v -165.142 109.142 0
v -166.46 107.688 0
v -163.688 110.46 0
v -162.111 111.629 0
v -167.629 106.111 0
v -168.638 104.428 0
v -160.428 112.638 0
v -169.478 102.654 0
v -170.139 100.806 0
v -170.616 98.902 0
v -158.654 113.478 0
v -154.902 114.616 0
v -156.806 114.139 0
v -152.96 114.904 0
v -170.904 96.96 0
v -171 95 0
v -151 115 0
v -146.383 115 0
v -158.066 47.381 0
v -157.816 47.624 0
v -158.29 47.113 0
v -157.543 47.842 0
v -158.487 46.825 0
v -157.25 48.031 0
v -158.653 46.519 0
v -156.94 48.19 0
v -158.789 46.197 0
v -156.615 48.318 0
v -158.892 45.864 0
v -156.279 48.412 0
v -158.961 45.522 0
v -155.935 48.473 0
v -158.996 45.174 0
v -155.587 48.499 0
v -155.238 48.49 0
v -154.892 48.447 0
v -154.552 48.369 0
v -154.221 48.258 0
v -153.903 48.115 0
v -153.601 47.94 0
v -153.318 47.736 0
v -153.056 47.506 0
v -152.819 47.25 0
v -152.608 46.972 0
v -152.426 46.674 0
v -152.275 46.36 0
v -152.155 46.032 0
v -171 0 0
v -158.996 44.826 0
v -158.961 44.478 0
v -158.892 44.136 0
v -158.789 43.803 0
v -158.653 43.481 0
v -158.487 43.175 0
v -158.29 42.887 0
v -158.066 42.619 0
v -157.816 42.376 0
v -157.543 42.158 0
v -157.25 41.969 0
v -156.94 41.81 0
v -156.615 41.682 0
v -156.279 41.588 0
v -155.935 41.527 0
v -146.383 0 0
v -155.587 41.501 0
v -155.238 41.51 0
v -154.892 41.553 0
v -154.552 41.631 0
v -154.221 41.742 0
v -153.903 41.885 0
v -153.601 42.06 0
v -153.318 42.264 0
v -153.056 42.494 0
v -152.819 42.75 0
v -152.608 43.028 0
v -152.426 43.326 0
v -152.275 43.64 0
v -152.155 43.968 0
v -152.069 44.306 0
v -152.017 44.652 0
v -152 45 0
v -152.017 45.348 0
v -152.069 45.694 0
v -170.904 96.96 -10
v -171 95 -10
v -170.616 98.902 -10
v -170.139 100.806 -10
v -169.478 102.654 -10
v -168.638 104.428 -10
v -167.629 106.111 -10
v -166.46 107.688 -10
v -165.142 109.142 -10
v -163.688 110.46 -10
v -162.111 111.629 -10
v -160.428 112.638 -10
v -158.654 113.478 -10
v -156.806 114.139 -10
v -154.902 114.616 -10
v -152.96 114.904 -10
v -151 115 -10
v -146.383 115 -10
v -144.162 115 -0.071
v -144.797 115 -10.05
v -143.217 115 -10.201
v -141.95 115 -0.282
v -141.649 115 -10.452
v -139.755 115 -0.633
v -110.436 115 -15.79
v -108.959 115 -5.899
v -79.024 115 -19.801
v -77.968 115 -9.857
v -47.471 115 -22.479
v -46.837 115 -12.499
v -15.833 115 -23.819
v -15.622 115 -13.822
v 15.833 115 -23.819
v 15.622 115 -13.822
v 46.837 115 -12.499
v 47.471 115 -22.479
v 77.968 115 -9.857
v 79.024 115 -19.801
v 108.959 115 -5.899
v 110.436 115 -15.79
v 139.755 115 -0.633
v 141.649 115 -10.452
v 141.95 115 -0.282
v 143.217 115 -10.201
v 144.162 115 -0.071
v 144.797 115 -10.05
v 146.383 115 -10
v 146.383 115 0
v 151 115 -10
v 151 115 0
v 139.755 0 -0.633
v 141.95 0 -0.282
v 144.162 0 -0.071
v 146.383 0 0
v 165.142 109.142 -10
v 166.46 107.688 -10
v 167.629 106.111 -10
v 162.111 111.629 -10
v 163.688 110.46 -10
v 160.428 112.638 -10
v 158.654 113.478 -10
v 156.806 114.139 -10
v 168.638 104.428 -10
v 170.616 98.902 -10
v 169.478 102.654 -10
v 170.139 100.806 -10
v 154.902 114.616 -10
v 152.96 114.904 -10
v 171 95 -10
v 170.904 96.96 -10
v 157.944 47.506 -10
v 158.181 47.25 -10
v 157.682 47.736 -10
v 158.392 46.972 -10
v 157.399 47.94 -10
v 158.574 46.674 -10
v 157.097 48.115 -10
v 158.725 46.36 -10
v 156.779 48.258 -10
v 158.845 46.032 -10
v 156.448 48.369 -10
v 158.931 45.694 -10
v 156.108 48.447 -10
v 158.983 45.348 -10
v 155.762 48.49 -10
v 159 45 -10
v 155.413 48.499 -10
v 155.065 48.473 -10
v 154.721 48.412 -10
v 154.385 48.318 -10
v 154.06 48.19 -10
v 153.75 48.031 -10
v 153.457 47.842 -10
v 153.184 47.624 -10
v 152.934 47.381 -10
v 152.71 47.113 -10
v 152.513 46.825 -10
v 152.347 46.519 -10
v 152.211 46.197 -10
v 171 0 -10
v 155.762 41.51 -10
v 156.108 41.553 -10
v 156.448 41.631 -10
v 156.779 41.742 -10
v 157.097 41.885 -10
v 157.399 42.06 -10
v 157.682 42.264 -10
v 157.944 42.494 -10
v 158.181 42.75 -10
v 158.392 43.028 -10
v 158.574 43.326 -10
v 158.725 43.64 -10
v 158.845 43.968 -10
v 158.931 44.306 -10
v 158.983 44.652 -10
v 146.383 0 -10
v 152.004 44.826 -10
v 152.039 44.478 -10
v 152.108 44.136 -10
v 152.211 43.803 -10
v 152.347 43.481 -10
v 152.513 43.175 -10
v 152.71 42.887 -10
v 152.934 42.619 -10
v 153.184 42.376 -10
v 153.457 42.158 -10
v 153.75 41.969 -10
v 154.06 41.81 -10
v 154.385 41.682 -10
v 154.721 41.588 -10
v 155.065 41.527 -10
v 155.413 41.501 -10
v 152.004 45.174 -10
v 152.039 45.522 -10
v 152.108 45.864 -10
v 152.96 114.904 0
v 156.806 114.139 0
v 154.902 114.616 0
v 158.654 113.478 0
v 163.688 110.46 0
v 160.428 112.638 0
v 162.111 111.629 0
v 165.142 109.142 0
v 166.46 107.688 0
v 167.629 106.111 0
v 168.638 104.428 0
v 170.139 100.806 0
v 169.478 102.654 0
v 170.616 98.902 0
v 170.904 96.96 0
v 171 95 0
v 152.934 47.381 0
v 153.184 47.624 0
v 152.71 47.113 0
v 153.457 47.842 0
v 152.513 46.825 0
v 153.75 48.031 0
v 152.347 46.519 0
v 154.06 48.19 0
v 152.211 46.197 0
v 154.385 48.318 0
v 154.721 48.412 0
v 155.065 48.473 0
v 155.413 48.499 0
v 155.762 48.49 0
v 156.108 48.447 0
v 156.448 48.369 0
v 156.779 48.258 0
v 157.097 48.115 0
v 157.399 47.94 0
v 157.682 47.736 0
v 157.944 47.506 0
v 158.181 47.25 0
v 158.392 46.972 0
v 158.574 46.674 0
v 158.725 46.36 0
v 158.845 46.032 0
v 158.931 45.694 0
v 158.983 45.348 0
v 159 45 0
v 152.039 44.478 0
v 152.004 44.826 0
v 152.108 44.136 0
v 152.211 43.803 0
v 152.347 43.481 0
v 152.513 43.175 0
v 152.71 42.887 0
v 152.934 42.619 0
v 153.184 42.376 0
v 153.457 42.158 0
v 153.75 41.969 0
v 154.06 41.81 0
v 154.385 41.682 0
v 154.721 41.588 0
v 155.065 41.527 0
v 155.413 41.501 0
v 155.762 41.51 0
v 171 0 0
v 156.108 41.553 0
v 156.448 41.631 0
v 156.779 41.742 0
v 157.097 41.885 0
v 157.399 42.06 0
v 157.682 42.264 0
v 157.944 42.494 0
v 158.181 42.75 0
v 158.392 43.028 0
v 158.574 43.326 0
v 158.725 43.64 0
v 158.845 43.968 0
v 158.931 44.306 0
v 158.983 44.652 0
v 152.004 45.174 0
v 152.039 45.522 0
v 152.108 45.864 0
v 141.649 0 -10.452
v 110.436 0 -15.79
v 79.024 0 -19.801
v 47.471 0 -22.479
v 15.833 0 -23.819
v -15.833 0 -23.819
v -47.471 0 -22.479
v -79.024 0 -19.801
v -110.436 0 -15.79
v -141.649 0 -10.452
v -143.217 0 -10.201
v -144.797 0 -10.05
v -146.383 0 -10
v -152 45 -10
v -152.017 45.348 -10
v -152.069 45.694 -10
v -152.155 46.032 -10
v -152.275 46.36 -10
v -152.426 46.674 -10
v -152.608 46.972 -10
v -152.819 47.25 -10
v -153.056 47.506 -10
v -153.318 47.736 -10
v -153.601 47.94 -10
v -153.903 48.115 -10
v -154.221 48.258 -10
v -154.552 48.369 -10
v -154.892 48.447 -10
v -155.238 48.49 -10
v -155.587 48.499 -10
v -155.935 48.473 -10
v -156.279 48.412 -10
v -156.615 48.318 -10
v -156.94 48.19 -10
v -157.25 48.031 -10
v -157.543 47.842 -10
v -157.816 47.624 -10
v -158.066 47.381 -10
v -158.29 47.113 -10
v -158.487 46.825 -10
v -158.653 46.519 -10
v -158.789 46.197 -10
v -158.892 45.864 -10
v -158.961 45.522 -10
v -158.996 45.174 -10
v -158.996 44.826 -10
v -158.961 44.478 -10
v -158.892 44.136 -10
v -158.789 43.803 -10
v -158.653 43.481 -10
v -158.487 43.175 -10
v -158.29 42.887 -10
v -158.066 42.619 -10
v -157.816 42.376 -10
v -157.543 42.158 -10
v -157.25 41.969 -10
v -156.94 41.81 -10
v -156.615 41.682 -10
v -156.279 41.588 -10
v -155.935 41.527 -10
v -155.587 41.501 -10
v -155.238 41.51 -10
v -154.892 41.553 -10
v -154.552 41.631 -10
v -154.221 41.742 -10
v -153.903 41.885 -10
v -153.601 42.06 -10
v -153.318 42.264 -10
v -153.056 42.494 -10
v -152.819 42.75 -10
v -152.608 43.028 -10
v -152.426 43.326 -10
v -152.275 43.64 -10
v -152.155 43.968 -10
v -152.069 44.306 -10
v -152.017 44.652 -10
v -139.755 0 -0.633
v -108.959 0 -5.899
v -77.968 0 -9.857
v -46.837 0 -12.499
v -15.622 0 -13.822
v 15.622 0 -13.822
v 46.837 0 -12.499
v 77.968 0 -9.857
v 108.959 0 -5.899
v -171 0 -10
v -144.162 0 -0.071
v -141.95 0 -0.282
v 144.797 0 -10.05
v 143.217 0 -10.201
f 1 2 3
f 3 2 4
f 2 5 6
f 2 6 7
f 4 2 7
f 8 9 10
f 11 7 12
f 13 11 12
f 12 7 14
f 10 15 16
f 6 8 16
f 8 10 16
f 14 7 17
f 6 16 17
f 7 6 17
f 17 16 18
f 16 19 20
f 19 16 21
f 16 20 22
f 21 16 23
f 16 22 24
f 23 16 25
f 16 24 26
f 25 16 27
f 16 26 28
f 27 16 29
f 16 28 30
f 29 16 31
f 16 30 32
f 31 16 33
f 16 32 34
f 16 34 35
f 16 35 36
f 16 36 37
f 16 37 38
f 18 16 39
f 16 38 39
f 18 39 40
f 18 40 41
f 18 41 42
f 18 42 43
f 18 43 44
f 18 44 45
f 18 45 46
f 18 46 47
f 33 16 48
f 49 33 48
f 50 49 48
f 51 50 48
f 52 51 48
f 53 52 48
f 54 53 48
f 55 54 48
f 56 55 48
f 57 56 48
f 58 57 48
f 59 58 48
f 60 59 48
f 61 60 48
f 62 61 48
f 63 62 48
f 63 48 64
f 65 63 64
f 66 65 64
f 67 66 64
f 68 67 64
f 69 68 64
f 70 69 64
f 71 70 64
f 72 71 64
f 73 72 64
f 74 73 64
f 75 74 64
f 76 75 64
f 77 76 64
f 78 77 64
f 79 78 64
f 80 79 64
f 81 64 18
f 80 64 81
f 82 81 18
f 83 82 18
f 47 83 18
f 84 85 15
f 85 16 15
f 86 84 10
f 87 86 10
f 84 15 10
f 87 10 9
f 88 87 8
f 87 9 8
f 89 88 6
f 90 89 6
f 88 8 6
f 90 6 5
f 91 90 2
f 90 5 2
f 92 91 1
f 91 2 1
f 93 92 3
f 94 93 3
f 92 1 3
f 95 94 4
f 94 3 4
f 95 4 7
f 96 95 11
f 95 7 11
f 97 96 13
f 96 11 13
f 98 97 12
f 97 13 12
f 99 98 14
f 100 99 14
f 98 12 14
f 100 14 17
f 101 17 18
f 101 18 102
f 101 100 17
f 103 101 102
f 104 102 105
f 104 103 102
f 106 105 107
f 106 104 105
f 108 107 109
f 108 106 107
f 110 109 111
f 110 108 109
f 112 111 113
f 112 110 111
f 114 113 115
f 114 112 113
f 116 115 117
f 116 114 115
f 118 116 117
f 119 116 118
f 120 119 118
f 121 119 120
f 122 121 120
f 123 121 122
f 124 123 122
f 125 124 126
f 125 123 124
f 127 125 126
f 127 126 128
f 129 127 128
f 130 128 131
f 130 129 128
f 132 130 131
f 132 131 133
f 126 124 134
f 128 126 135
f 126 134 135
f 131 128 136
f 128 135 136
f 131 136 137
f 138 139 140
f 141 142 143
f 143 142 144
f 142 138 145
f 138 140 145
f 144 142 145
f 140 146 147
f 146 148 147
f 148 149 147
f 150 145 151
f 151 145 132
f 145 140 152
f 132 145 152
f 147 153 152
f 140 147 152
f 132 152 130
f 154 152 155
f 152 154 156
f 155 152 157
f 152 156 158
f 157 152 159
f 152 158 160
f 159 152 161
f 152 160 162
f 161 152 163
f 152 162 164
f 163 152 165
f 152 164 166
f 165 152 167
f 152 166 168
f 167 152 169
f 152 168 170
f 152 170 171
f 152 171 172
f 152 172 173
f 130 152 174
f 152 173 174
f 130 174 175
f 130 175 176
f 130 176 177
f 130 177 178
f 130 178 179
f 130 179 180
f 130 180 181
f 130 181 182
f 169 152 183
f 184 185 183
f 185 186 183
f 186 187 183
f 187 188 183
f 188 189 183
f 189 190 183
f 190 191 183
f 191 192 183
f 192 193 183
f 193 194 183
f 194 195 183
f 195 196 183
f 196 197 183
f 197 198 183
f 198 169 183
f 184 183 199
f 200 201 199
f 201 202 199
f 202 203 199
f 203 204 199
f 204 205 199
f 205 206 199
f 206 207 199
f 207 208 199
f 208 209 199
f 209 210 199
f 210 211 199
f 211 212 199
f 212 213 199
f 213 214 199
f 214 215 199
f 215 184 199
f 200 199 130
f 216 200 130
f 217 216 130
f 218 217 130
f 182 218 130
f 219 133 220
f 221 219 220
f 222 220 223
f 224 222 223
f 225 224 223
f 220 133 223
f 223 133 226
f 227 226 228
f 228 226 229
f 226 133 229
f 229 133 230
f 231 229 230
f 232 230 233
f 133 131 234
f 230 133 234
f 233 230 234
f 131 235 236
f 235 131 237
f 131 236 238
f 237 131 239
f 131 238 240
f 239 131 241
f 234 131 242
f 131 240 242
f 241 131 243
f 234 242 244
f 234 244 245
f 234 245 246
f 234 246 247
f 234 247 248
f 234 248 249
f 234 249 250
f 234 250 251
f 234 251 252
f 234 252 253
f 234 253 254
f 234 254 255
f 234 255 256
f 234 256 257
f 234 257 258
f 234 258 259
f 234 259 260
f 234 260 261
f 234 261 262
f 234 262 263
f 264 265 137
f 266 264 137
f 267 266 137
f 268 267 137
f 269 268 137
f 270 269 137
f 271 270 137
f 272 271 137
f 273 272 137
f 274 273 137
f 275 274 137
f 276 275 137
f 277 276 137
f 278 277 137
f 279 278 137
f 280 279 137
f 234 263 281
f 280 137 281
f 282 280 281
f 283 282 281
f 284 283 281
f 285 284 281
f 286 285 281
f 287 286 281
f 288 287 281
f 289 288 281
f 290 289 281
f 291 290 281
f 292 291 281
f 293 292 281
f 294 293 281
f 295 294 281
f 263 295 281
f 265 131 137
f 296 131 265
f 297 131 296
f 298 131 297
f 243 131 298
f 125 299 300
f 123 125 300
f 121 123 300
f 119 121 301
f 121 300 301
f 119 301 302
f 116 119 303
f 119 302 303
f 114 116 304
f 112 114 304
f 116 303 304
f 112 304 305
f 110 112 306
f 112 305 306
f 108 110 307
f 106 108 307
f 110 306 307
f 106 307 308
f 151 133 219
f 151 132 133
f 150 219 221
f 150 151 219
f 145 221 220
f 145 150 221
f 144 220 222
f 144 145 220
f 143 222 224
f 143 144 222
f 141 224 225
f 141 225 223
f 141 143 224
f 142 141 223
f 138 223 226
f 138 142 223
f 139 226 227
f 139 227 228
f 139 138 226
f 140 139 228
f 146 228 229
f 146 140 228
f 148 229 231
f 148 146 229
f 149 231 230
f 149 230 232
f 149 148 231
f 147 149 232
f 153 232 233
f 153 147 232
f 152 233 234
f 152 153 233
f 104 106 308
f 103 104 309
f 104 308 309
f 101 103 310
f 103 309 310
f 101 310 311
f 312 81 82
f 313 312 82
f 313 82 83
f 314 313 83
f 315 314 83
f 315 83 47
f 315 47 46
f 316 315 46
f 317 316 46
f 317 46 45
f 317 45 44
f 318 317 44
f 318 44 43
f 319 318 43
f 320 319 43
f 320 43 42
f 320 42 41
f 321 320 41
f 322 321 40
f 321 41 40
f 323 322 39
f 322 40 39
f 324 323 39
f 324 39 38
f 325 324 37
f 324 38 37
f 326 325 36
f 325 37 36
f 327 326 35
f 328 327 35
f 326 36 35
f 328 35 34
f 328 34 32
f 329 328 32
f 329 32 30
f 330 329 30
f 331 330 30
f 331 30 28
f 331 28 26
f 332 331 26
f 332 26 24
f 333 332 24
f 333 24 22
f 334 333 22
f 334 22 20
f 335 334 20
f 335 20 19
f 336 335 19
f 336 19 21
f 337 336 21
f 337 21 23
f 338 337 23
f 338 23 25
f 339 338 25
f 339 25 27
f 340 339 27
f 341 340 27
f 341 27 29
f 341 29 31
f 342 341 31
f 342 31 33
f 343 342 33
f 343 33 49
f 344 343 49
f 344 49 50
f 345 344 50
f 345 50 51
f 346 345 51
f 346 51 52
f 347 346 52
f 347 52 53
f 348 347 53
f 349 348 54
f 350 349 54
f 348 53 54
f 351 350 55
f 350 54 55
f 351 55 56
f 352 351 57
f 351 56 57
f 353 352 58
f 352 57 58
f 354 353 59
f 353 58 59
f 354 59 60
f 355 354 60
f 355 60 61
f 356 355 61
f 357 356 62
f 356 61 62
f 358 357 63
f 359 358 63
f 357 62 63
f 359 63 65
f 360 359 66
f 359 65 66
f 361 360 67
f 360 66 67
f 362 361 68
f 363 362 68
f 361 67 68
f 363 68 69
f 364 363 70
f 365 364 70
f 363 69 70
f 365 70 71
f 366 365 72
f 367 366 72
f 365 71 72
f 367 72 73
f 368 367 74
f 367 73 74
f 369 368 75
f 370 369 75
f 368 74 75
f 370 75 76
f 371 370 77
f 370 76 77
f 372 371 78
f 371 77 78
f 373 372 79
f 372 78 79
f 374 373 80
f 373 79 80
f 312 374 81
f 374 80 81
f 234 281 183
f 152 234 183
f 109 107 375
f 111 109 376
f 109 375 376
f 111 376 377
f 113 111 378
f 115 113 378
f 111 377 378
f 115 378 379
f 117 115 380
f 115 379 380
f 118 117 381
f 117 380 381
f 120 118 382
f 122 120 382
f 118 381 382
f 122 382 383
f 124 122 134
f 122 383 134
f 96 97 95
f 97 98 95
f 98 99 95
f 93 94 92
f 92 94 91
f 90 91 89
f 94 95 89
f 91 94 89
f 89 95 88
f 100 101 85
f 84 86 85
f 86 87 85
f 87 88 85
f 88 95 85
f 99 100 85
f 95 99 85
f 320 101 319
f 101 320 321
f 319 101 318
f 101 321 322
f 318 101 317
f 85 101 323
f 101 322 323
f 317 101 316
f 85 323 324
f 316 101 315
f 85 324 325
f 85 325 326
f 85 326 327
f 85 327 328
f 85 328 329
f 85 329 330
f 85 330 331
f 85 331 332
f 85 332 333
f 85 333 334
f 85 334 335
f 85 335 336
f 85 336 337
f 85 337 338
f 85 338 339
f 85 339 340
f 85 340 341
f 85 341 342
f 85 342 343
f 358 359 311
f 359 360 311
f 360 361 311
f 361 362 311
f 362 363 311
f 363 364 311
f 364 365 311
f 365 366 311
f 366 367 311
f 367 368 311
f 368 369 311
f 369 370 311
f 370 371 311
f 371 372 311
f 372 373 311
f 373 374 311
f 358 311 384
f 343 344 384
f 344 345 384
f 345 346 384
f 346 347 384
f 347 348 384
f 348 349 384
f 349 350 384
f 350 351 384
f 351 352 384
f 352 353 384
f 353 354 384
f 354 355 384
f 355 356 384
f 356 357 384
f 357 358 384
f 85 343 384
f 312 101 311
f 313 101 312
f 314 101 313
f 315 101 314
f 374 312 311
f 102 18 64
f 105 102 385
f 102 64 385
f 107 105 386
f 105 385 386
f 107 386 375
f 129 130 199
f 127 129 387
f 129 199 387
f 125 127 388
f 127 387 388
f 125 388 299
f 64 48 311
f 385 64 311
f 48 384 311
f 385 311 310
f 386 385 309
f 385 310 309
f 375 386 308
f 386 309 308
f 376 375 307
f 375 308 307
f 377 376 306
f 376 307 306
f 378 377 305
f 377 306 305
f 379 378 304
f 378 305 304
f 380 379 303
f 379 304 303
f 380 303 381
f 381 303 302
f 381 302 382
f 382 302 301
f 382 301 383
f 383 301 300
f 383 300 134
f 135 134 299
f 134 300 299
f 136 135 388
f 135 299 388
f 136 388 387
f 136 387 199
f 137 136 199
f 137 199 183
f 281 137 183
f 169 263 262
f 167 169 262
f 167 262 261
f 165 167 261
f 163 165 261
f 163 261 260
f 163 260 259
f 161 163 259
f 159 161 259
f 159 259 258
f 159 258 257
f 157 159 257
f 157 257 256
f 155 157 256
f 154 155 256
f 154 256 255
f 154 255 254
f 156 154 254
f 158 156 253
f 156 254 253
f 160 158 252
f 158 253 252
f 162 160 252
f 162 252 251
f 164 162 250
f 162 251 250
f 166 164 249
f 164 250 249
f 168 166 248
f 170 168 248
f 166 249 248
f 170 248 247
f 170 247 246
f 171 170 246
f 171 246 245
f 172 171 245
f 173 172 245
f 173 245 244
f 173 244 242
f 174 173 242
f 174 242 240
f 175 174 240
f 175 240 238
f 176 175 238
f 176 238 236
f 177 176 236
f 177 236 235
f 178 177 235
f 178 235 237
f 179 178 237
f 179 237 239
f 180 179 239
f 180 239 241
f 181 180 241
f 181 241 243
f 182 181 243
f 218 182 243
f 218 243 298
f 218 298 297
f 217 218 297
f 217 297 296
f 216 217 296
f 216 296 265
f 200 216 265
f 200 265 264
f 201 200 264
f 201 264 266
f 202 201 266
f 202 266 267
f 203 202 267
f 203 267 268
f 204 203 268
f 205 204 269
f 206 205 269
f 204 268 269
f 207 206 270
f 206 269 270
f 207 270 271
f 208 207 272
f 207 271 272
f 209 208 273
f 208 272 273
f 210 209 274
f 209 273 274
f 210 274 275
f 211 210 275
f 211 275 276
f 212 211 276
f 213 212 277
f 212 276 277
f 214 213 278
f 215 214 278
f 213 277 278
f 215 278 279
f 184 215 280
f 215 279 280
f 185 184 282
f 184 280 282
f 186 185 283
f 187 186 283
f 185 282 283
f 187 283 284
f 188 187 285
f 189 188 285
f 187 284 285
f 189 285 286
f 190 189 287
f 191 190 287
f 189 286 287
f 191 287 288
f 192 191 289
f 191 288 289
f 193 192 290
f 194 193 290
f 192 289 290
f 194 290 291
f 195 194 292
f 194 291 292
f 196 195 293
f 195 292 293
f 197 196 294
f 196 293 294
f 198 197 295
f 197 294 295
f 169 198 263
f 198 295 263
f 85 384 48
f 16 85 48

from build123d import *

# Parameters (mm, degrees)
EXTRUDE_1_DEPTH     = 115
SKETCH_4_R          = 3.5
CUT_EXTRUDE_2_DEPTH = 208.464142308
FILLET_1_R          = 20


with BuildPart() as part:
    # Эскиз1 → Вытянуть-Тонкостенный1 (new body)
    with BuildSketch(Plane(origin=(0, 0, 0), x_dir=(1, 0, 0), z_dir=(0, 1, 0))):
        with BuildLine():
            Line((-171, 0), (-146.383337508, 0))
            ThreePointArc((-146.383337508, 0), (-143.05426157, 0.158684678), (-139.755372679, 0.633299806))
            ThreePointArc((-139.755372679, 0.633299806), (0, 13.986878572), (139.755372679, 0.633299806))
            ThreePointArc((139.755372679, 0.633299806), (143.05426157, 0.158684678), (146.383337508, 0))
            Line((146.383337508, 0), (171, 0))
            Line((171, 0), (171, 10))
            Line((171, 10), (146.383337508, 10))
            ThreePointArc((146.383337508, 10), (144.005426124, 10.113346198), (141.649076916, 10.452357004))
            ThreePointArc((141.649076916, 10.452357004), (0, 23.986878572), (-141.649076916, 10.452357004))
            ThreePointArc((-141.649076916, 10.452357004), (-144.005426124, 10.113346198), (-146.383337508, 10))
            Line((-146.383337508, 10), (-171, 10))
            Line((-171, 10), (-171, 0))
        make_face()
    extrude(amount=EXTRUDE_1_DEPTH)

    # Эскиз4 → Вырез-Вытянуть2 (cut, through all)
    with BuildSketch(Plane.XY):
        with Locations((-155.5, 45)):
            Circle(SKETCH_4_R)
        with Locations((155.5, 45)):
            Circle(SKETCH_4_R)
    extrude(amount=-CUT_EXTRUDE_2_DEPTH, mode=Mode.SUBTRACT)

    # Скругление1
    fillet_1_edges = [part.edges().sort_by_distance(p)[0] for p in [
        (171, 115, -5),
        (-171, 115, -5),
    ]]
    fillet(fillet_1_edges, radius=FILLET_1_R)


solid = part.part
